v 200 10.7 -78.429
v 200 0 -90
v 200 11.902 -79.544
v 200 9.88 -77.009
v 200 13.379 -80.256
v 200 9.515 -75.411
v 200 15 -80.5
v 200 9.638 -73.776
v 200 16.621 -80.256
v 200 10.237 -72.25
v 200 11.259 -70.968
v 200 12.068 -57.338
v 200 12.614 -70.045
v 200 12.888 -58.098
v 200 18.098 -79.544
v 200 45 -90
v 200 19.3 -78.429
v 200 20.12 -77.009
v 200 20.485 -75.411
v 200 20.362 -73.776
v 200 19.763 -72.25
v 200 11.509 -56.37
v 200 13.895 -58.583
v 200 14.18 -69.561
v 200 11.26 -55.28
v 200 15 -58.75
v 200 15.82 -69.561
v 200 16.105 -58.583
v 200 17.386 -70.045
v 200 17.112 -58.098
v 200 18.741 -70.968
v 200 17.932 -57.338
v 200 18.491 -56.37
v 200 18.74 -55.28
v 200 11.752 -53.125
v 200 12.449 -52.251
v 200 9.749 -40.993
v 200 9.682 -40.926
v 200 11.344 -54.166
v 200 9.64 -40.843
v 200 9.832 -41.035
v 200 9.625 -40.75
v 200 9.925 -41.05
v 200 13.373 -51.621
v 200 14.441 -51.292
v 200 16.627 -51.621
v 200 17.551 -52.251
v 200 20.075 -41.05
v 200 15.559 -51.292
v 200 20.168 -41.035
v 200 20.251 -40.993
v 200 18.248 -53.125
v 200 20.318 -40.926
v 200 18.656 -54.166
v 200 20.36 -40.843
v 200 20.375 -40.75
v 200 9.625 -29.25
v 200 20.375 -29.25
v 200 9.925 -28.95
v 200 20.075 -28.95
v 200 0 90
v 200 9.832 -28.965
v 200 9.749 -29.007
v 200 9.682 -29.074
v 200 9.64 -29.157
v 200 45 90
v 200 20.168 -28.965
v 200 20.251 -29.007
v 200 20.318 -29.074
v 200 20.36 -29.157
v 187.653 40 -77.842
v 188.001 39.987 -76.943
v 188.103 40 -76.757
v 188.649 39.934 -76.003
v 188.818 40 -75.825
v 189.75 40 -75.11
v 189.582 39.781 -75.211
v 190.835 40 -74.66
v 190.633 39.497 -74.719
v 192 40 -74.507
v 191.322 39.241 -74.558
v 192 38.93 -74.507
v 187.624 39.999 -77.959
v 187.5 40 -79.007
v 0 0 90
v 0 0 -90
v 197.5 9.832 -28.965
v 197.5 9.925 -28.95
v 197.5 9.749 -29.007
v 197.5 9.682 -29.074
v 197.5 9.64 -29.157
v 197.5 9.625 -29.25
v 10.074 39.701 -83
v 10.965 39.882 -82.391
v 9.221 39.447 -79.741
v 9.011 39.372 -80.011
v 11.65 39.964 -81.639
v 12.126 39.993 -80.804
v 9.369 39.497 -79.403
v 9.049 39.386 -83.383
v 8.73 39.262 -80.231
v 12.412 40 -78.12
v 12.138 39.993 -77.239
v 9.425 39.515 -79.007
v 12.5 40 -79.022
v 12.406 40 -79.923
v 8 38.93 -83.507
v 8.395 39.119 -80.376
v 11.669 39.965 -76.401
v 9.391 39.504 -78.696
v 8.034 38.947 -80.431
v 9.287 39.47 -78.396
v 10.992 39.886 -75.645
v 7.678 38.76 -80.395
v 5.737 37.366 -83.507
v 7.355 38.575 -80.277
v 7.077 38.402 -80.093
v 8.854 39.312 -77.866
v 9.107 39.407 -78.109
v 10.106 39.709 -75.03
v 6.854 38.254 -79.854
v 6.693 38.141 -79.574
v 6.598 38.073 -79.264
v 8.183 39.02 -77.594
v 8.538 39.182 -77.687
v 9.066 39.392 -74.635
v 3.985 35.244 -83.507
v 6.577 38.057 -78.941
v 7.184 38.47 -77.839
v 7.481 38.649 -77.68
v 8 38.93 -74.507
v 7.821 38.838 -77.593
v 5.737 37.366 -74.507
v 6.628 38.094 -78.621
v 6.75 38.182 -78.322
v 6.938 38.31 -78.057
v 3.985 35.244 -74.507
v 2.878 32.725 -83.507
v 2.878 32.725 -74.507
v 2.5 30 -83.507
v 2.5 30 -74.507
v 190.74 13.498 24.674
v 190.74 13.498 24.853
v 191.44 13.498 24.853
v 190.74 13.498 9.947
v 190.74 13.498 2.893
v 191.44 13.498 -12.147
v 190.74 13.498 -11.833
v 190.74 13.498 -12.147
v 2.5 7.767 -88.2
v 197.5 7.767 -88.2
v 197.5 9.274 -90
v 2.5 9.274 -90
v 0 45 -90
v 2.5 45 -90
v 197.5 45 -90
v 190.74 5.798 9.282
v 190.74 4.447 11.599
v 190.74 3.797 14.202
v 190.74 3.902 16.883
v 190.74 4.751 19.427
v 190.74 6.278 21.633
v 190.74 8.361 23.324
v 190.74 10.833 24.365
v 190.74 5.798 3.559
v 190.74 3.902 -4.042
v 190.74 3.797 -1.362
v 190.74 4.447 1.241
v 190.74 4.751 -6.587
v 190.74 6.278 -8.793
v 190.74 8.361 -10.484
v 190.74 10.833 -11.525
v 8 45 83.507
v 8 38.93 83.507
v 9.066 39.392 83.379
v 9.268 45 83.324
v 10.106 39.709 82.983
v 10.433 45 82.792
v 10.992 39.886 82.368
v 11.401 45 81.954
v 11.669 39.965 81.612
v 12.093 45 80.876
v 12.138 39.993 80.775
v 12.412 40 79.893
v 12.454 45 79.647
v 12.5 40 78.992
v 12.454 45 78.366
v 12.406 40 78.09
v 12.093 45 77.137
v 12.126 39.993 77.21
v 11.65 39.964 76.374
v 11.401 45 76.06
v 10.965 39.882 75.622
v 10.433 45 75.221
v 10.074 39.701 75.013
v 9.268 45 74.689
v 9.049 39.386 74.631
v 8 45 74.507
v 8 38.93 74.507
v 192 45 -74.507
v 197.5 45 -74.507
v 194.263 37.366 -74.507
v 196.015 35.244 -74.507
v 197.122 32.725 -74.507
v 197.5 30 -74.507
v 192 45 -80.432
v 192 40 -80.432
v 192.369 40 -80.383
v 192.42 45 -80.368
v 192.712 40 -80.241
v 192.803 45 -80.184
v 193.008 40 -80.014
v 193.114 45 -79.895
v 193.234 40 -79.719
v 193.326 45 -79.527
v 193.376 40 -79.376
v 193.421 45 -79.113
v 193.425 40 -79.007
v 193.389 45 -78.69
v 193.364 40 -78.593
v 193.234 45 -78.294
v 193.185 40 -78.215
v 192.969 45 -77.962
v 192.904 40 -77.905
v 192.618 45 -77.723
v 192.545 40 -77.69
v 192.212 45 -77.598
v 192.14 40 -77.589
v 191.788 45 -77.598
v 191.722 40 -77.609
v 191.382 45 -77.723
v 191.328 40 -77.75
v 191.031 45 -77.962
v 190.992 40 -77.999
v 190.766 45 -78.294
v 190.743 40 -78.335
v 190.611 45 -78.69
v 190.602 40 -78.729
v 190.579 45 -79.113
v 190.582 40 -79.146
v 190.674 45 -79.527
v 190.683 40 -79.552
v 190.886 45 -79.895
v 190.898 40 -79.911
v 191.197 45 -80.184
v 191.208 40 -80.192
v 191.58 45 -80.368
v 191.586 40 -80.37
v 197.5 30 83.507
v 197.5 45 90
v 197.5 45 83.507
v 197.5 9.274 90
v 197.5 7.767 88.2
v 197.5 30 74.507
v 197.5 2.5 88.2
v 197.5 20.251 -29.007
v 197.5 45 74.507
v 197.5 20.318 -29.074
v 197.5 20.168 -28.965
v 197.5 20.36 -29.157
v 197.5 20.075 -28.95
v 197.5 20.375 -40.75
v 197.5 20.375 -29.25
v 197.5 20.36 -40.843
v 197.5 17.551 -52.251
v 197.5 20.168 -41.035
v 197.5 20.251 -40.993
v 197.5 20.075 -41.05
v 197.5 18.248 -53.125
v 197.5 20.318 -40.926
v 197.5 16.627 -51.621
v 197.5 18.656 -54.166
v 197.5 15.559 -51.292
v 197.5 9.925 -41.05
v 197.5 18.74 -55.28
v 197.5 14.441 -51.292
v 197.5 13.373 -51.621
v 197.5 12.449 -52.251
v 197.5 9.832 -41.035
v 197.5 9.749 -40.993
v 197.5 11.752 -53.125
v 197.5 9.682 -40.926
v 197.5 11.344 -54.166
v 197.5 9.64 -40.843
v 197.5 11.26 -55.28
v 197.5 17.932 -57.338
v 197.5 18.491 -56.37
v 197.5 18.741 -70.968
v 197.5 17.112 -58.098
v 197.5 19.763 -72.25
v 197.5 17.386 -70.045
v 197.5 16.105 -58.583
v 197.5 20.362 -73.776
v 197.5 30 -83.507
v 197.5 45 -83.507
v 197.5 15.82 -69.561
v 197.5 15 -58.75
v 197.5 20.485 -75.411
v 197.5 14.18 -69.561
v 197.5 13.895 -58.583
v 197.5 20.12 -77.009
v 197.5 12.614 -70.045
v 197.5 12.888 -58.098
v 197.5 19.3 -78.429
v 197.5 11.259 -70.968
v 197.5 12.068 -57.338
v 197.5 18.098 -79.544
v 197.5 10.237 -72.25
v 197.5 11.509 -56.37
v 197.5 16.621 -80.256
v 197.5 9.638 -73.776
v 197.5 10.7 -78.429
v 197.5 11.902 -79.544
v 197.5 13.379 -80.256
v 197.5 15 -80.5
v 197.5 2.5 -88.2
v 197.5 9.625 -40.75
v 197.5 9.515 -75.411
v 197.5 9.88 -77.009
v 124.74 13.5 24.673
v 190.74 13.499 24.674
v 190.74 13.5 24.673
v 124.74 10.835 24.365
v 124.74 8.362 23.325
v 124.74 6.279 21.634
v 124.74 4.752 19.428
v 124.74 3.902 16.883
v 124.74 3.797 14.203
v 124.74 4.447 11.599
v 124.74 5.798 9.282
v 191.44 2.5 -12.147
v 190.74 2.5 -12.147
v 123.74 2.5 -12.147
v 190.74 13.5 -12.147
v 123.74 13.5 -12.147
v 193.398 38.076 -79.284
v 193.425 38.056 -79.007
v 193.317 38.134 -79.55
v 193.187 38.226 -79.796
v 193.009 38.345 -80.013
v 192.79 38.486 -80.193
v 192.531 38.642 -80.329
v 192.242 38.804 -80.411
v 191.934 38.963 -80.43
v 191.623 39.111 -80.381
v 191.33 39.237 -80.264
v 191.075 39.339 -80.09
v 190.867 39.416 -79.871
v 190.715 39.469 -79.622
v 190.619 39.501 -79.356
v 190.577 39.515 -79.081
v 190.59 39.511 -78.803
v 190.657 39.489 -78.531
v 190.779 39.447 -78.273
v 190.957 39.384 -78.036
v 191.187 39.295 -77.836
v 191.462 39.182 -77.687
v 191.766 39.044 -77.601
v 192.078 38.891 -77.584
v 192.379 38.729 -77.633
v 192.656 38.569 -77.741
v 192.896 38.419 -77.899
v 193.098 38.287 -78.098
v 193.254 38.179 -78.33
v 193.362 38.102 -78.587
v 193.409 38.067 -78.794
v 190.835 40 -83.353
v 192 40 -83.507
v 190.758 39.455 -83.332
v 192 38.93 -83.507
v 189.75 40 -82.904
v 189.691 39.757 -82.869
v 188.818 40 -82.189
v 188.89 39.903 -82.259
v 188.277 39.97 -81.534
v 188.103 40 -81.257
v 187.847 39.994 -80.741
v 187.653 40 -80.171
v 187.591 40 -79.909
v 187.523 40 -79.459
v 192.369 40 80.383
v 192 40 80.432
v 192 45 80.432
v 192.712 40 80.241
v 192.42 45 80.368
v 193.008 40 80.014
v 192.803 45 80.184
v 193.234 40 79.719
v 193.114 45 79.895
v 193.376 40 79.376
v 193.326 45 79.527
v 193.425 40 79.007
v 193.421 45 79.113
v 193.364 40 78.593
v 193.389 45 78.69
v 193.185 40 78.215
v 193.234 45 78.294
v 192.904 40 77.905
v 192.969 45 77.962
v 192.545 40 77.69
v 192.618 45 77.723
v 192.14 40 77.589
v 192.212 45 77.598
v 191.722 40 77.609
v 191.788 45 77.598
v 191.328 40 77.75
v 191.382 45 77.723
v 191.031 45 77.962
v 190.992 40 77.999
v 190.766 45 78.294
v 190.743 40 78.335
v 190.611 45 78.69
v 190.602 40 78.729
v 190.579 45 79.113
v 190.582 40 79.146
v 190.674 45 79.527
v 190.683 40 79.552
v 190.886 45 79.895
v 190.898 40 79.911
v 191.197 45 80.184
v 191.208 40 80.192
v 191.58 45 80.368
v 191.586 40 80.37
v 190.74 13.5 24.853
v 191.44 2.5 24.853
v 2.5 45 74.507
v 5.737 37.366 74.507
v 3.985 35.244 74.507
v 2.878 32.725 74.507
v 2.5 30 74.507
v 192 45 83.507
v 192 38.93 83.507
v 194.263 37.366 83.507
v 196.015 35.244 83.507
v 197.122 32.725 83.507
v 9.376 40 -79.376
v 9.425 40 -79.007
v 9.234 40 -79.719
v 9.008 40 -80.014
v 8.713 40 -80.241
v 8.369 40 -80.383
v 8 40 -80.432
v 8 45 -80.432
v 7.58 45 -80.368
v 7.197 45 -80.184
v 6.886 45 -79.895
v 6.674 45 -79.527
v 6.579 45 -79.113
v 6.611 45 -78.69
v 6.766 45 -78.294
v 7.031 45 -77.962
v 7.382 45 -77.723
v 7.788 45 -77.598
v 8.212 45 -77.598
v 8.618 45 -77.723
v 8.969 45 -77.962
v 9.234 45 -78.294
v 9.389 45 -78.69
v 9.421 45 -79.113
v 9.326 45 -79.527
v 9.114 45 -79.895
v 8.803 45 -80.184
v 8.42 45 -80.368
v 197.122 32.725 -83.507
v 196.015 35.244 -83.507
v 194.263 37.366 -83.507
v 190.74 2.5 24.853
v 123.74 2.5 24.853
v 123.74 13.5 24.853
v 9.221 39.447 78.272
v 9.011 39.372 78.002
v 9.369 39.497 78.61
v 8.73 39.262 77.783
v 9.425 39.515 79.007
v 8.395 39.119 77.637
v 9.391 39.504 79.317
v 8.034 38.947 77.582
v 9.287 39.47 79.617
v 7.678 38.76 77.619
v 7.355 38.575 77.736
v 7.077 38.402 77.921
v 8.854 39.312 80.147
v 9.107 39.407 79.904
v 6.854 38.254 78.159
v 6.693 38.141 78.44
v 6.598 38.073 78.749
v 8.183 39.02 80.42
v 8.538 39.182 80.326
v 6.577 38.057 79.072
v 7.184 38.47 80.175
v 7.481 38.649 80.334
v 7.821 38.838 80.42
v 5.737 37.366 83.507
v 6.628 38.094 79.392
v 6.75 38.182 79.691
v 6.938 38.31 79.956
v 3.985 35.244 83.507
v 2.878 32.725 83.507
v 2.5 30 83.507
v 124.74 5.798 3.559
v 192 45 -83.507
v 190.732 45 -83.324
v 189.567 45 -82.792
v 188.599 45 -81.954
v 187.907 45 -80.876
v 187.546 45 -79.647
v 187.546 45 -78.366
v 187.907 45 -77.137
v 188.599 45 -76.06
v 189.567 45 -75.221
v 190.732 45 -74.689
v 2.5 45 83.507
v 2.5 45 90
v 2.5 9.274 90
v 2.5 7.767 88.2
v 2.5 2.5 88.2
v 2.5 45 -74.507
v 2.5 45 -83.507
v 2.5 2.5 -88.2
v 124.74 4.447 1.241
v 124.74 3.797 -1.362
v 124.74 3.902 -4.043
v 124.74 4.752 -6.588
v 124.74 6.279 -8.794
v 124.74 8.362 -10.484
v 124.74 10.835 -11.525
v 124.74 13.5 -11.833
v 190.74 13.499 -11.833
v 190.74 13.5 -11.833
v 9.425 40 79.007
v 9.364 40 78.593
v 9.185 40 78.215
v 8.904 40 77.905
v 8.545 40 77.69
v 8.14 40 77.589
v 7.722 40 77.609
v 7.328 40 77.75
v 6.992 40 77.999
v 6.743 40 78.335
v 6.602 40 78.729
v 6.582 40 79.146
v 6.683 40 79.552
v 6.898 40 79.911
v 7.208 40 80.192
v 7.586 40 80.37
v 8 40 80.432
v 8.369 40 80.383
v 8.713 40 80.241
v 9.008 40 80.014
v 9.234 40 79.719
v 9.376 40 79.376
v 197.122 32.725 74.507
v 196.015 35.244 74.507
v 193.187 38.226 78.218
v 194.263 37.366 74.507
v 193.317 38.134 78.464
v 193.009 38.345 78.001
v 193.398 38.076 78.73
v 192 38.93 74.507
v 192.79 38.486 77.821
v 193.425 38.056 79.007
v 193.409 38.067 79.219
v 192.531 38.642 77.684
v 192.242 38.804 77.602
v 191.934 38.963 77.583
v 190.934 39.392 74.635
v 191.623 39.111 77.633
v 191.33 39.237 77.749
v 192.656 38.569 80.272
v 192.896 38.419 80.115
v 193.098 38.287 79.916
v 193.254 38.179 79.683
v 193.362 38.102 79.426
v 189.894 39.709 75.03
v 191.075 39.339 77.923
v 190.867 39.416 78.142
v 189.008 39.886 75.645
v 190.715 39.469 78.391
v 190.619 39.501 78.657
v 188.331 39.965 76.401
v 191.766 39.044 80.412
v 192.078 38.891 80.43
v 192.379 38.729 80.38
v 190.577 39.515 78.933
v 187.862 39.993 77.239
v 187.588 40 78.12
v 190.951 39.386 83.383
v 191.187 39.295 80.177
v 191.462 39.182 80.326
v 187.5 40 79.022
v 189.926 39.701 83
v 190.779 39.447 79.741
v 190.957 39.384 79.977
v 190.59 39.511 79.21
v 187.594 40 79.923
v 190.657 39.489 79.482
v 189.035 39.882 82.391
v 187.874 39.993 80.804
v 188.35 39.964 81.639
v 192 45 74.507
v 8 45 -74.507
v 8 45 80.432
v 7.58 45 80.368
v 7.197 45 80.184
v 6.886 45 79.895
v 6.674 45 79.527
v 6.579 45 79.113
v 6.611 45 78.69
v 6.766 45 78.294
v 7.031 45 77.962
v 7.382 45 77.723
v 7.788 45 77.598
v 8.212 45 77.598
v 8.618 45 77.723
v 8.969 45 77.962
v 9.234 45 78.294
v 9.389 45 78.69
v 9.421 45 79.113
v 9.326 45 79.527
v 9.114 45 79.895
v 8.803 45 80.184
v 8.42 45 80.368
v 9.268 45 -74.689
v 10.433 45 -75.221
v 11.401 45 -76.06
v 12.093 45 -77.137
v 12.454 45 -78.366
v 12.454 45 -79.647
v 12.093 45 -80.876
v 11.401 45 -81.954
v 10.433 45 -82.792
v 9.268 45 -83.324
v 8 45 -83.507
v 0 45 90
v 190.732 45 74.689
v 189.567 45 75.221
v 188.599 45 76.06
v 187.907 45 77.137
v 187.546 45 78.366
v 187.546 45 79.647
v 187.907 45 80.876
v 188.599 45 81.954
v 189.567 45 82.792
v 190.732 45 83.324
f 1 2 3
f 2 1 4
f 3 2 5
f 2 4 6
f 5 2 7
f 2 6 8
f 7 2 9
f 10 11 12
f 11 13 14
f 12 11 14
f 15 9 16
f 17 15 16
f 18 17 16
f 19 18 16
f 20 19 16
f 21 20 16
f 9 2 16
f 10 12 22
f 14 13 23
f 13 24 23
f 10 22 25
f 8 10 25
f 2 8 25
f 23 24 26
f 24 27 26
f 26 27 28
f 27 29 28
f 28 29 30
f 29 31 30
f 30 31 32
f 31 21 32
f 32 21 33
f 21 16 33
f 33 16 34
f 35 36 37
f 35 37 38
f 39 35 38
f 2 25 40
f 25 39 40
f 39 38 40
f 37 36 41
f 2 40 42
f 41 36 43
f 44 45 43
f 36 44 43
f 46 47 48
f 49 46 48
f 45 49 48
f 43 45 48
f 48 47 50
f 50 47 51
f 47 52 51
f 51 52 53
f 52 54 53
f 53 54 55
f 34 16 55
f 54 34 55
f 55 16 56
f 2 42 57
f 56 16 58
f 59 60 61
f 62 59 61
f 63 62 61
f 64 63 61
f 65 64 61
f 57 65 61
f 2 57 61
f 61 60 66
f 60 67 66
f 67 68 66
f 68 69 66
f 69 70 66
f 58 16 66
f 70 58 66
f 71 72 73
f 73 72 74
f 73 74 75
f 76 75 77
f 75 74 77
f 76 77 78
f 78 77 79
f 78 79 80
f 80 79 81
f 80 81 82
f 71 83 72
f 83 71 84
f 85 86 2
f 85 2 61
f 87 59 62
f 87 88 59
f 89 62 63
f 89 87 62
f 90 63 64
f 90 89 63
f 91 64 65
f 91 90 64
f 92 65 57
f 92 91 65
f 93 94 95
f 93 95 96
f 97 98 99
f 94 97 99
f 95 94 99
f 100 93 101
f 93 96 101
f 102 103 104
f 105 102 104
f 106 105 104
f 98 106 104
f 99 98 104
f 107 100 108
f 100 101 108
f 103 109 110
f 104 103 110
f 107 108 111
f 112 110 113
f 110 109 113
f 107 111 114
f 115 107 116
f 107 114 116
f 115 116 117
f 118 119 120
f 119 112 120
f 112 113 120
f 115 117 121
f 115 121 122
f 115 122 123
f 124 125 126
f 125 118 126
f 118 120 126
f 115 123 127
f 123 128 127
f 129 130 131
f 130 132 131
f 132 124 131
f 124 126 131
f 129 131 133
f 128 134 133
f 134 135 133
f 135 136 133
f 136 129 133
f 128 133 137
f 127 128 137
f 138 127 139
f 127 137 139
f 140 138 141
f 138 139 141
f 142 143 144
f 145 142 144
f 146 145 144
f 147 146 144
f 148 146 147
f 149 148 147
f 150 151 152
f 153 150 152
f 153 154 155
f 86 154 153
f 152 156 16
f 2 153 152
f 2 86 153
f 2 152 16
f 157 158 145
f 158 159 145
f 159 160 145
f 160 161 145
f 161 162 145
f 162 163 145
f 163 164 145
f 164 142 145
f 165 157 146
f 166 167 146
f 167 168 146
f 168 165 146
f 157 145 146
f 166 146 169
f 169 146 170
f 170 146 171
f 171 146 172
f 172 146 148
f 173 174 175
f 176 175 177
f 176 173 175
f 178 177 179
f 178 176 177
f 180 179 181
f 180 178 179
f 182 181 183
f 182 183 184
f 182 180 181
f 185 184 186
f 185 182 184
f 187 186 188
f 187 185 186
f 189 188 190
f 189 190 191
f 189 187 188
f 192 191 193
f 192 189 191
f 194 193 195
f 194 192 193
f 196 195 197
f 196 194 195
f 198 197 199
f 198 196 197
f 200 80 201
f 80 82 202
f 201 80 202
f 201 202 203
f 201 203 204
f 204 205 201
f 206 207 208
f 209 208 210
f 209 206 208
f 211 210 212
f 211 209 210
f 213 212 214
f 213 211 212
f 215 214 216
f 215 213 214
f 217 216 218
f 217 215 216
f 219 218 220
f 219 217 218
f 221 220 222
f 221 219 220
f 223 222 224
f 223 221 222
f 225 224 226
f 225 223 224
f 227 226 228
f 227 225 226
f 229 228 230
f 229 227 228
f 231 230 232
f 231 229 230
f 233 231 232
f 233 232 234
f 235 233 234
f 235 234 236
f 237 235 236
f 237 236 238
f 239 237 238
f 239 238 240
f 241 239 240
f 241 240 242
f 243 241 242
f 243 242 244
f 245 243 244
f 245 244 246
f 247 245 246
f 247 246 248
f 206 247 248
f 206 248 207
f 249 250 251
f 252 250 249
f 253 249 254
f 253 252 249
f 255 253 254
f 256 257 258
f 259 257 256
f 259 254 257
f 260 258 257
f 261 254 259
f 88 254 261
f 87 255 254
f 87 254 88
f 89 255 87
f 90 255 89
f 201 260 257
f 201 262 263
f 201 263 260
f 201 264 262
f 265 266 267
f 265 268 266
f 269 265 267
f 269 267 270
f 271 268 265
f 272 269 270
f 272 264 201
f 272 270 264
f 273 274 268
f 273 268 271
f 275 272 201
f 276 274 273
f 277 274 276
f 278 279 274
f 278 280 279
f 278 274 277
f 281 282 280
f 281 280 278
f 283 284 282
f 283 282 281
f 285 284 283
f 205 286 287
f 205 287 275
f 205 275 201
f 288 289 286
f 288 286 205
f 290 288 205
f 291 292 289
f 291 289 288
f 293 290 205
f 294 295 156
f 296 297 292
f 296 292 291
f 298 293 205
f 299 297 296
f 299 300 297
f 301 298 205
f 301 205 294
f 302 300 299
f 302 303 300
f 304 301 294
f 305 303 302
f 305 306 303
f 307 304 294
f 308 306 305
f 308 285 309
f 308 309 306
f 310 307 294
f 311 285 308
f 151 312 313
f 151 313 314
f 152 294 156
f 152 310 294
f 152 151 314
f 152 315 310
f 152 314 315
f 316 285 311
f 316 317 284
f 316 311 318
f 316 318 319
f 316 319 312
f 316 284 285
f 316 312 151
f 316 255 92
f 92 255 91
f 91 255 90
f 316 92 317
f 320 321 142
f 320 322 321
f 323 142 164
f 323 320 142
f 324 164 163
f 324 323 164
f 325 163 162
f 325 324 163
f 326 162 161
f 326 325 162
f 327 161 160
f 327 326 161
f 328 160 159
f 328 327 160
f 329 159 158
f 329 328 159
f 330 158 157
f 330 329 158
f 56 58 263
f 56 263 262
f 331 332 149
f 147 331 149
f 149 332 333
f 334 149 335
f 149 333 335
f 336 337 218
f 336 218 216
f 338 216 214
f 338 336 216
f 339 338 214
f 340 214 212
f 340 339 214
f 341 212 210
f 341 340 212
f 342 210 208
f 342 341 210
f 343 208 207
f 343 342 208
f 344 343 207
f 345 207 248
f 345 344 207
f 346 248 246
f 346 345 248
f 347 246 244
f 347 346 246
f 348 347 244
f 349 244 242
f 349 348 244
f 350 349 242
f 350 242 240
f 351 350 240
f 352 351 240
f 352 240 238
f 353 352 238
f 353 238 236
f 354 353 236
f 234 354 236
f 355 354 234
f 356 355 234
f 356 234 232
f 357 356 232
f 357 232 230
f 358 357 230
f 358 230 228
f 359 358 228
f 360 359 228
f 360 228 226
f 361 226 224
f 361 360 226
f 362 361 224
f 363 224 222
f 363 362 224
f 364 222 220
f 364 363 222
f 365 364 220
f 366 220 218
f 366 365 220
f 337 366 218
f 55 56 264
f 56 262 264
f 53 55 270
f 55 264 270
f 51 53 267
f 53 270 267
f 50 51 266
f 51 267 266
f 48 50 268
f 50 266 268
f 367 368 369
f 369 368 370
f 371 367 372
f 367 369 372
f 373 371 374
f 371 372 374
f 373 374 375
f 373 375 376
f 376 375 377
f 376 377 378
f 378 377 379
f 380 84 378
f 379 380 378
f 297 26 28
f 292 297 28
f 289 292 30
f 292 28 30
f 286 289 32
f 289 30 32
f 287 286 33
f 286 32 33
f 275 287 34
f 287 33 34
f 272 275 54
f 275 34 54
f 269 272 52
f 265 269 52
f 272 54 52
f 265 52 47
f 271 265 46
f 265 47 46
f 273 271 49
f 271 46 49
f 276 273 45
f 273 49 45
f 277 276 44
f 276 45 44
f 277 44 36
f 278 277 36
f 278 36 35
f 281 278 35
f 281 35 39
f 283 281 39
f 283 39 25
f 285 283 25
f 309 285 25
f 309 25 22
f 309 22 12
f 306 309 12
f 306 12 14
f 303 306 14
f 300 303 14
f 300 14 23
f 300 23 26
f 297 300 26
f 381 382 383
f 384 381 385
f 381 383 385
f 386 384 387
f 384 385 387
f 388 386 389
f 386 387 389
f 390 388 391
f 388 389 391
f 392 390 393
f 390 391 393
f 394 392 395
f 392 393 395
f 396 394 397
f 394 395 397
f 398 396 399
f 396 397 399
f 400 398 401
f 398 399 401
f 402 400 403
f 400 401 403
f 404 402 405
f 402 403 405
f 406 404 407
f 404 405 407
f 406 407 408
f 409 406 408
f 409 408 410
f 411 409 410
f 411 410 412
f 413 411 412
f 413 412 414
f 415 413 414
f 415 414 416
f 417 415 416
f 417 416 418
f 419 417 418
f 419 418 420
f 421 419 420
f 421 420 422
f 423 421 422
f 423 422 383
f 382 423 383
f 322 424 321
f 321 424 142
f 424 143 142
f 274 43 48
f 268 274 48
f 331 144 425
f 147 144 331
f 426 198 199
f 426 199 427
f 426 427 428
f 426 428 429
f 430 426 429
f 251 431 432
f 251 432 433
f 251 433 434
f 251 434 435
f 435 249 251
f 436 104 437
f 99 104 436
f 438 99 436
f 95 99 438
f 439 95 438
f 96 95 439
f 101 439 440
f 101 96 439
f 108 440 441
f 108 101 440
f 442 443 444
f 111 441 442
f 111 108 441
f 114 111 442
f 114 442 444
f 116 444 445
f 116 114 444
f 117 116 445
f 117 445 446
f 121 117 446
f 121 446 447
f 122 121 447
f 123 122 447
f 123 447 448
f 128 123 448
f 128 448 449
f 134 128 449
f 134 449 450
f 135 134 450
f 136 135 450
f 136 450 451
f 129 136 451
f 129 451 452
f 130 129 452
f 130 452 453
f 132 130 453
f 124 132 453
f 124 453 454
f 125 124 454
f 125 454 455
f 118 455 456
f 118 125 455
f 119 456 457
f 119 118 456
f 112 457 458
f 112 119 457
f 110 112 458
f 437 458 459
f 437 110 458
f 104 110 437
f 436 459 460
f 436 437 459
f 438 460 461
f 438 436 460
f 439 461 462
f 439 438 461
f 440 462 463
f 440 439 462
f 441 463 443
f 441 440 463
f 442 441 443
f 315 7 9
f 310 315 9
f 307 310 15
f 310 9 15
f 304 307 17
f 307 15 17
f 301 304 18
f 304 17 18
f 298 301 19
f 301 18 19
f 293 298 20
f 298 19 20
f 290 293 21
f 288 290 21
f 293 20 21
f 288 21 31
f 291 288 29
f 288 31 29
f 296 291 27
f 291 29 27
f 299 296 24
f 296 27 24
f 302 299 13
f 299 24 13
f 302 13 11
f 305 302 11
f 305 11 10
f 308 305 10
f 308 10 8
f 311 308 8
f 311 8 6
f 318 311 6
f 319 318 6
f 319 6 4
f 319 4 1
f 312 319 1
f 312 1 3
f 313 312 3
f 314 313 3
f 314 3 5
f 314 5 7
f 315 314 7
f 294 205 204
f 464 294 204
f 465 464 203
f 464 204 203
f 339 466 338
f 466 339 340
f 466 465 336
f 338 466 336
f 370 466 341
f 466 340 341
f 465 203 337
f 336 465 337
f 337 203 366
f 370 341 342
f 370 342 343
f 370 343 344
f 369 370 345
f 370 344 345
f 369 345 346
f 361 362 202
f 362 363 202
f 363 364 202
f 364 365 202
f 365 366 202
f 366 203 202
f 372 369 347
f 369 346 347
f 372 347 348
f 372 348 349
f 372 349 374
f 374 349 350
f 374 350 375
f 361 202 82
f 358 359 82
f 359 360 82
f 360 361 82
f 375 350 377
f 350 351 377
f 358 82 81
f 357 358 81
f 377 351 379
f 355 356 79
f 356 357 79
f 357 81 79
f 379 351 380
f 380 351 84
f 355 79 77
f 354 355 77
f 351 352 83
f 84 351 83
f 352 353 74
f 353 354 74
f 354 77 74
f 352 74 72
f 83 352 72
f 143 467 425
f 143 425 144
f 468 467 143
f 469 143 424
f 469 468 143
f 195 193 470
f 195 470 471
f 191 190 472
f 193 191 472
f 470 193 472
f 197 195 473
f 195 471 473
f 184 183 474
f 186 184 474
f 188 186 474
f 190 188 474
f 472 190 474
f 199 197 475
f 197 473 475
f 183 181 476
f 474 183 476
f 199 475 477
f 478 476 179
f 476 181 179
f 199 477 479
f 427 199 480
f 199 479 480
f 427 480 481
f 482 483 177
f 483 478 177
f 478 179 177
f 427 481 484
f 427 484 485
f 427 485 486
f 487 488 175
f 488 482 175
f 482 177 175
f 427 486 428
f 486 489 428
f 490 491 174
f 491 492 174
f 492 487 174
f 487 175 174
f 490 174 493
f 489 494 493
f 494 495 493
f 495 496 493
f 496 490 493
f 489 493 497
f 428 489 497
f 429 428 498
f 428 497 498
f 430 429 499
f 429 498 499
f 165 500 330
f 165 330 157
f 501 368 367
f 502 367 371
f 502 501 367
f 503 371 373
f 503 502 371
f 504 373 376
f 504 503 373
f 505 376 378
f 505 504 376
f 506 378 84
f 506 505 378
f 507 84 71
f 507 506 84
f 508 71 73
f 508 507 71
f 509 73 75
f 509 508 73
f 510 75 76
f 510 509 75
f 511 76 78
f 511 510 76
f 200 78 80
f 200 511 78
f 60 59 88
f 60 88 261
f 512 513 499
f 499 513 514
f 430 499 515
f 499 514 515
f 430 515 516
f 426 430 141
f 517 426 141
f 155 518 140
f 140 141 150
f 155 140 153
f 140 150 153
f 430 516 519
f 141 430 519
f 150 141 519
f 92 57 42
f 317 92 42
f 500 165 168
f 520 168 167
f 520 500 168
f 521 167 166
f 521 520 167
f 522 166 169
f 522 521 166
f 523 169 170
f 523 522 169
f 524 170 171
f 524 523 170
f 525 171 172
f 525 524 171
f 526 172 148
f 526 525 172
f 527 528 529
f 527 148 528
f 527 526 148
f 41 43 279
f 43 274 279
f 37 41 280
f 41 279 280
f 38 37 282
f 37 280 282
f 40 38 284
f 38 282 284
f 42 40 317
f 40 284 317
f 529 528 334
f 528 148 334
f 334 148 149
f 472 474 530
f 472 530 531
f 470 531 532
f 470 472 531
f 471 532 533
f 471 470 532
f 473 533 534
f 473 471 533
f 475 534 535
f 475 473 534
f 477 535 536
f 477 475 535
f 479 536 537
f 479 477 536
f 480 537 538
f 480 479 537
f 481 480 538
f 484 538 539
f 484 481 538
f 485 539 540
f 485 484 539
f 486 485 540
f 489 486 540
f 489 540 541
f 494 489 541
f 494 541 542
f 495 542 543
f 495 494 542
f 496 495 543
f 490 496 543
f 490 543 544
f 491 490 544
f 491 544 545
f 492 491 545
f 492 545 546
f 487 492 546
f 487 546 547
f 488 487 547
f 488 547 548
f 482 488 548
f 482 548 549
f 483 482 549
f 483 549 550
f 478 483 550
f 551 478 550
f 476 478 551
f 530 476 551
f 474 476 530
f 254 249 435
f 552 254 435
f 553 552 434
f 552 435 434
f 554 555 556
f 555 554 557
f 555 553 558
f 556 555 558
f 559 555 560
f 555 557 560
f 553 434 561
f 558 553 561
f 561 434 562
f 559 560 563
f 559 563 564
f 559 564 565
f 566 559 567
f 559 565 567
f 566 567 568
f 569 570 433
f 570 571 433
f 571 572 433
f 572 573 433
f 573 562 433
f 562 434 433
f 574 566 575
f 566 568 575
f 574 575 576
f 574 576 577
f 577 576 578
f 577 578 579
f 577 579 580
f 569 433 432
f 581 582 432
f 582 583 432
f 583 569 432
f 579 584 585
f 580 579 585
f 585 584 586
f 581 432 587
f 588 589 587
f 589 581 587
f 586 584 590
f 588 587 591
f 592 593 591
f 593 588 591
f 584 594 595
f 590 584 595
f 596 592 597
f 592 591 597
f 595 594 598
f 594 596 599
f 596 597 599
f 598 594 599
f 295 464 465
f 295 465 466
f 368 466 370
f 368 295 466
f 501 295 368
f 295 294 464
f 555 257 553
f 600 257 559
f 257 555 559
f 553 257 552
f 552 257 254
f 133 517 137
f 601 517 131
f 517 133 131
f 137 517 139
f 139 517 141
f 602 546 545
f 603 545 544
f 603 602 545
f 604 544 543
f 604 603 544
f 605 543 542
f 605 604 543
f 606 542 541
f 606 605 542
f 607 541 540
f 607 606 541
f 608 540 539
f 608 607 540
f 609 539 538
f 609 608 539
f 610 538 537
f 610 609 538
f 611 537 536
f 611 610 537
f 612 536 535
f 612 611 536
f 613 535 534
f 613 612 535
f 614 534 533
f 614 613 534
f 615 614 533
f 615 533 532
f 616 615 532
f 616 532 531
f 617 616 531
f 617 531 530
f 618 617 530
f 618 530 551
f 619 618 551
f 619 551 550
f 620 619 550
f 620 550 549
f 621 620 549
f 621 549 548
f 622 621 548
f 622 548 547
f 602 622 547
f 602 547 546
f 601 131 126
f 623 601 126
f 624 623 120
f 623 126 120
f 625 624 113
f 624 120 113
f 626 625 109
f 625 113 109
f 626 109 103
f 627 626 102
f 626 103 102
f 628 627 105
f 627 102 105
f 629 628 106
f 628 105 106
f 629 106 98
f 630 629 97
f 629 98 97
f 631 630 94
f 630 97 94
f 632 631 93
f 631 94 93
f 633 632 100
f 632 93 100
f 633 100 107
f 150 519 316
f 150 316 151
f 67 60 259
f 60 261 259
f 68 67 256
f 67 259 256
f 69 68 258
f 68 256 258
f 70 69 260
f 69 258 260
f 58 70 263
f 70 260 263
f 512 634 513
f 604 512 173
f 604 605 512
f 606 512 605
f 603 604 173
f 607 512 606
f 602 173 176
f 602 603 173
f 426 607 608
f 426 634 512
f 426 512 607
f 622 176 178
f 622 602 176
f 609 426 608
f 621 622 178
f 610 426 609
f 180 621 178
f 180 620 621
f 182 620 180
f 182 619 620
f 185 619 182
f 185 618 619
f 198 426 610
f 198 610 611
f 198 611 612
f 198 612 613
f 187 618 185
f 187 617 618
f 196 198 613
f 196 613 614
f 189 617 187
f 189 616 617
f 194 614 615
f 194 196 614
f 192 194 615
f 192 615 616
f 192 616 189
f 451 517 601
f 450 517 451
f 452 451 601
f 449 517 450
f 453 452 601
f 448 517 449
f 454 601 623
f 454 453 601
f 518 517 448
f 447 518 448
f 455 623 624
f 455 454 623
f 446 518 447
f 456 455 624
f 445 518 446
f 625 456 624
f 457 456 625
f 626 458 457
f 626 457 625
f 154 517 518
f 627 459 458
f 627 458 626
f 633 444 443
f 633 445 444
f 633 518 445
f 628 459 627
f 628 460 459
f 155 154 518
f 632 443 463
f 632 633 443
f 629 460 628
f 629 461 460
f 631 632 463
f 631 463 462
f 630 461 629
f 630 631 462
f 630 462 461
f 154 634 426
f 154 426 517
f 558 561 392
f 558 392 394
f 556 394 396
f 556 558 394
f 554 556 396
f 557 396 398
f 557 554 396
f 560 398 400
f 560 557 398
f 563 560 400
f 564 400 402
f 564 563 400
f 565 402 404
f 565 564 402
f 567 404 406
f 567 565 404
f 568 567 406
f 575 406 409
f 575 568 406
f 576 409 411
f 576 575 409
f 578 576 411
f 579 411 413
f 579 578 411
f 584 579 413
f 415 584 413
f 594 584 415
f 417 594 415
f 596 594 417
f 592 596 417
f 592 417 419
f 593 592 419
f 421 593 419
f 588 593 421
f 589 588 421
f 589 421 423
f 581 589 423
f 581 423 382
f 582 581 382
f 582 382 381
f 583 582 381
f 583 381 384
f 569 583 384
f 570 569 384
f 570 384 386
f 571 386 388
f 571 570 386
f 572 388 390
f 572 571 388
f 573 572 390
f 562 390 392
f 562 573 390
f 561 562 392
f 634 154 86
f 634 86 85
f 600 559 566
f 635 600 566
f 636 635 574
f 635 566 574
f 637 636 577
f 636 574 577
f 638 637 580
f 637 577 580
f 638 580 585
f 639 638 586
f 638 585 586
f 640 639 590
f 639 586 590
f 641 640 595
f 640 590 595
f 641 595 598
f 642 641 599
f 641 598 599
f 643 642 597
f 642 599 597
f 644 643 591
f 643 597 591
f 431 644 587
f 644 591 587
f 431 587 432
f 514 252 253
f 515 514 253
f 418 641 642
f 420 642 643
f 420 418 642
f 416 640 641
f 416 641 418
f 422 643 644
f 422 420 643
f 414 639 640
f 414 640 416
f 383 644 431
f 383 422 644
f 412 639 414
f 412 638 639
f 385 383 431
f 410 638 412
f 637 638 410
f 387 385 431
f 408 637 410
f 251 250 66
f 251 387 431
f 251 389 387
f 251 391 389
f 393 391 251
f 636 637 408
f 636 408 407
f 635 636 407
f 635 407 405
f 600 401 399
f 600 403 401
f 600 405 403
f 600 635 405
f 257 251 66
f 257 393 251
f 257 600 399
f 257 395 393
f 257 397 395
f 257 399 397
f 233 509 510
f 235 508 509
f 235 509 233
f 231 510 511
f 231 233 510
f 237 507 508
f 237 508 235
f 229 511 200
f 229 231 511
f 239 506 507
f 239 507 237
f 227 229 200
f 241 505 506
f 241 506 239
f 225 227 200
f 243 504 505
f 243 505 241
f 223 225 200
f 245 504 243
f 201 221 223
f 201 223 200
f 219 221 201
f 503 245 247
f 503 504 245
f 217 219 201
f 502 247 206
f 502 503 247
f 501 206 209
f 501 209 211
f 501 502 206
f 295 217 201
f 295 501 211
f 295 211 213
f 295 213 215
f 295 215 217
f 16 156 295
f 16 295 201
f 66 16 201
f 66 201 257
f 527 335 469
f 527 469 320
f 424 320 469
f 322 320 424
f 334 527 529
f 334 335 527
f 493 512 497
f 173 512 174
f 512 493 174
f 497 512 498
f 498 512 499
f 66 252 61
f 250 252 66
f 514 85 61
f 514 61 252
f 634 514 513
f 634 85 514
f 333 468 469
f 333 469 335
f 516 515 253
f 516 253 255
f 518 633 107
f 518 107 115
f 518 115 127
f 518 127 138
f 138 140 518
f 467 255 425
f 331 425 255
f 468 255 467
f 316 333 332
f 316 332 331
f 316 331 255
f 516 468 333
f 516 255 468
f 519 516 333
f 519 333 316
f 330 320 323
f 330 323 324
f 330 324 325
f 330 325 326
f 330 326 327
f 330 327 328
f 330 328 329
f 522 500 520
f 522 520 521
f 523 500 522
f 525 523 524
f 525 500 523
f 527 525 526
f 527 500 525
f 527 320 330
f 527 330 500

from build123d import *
from build123d.topology import SkipClean

# Parameters (mm, degrees)
SALIENTE_EXTRUIR1_DEPTH    = 200
CROQUIS2_W                 = 2.5
CROQUIS2_H                 = 180
SALIENTE_EXTRUIR2_DEPTH    = 42.5
CROQUIS3_R                 = 5.5
CORTAR_EXTRUIR1_DEPTH      = 4
CROQUIS4_R                 = 3.75
CORTAR_EXTRUIR2_DEPTH      = 4
CROQUIS7_W                 = 12.1
CROQUIS7_H                 = 10.75
CORTAR_EXTRUIR3_DEPTH      = 4
REDONDEO1_R                = 0.3
CROQUIS8_R                 = 1.425
SALIENTE_EXTRUIR3_DEPTH    = 5
SIMETR_A2_COPY_1_SKETCH_R  = 1.425
SIMETR_A2_COPY_1_DEPTH     = 5
REDONDEO4_START            = 29.9999999
REDONDEO4_OUTLINE_R        = 1.425
REDONDEO4_DEPTH            = 10.0000001
REDONDEO4_2_OUTLINE_W      = 10
REDONDEO4_2_OUTLINE_H      = 9.000004552
REDONDEO4_2_OUTLINE_H_2    = 9.000004551
REDONDEO5_START            = 29.9999999
REDONDEO5_OUTLINE_R        = 1.425
REDONDEO5_DEPTH            = 10.0000001
REDONDEO5_2_OUTLINE_W      = 10
REDONDEO5_2_OUTLINE_H      = 9.000004551
REDONDEO5_2_OUTLINE_H_2    = 9.000004552
CROQUIS9_W                 = 67
CROQUIS9_H                 = 37
SALIENTE_EXTRUIR4_DEPTH    = 20
CORTAR_EXTRUIR5_DEPTH      = 1
CORTAR_EXTRUIR5_DEPTH_BACK = 66
CROQUIS11_W                = 69.586098965
CROQUIS11_H                = 38.970086607
CORTAR_EXTRUIR6_DEPTH      = 9
CROQUIS12_W                = 37
CROQUIS12_H                = 10.997736301
SALIENTE_EXTRUIR5_DEPTH    = 0.7
CROQUIS14_W                = 66
CROQUIS14_H                = 7.054690465
CORTAR_EXTRUIR7_DEPTH      = 7.7


with BuildPart() as part:
    # Croquis1 → Saliente-Extruir1 (new body)
    with BuildSketch(Plane(origin=(0, 0, 0), x_dir=(0, 0, -1), z_dir=(1, 0, 0))):
        Polygon((90, 9.273962115), (90, 0), (-90, 0), (-90, 9.273962115), (-88.2, 7.766551311), (-88.2, 2.5), (88.2, 2.5), (88.2, 7.766551311), align=None)
    extrude(amount=SALIENTE_EXTRUIR1_DEPTH)

    # Croquis2 → Saliente-Extruir2 (add)
    with BuildSketch(Plane(origin=(0, 2.5, 0), x_dir=(1, 0, 0), z_dir=(0, 1, 0))):
        with Locations((198.75, 0)):
            Rectangle(CROQUIS2_W, CROQUIS2_H)
        with Locations((1.25, 0)):
            Rectangle(CROQUIS2_W, CROQUIS2_H)
    extrude(amount=SALIENTE_EXTRUIR2_DEPTH)

    # Croquis3 → Cortar-Extruir1 (cut)
    with BuildSketch(Plane(origin=(200, 0, 0), x_dir=(0, 0, -1), z_dir=(1, 0, 0))):
        with Locations((75, 15)):
            Circle(CROQUIS3_R)
    extrude(amount=-CORTAR_EXTRUIR1_DEPTH, mode=Mode.SUBTRACT)

    # Croquis4 → Cortar-Extruir2 (cut)
    with BuildSketch(Plane(origin=(200, 0, 0), x_dir=(0, 0, -1), z_dir=(1, 0, 0))):
        with Locations((55, 15)):
            Circle(CROQUIS4_R)
    extrude(amount=-CORTAR_EXTRUIR2_DEPTH, mode=Mode.SUBTRACT)

    # Croquis7 → Cortar-Extruir3 (cut)
    with BuildSketch(Plane(origin=(200, 0, 0), x_dir=(0, 0, -1), z_dir=(1, 0, 0))):
        with Locations((35, 15)):
            Rectangle(CROQUIS7_W, CROQUIS7_H)
    extrude(amount=-CORTAR_EXTRUIR3_DEPTH, mode=Mode.SUBTRACT)

    # Redondeo1
    redondeo1_edges = [part.edges().sort_by_distance(p)[0] for p in [
        (198.75, 20.375, -41.05),
        (198.75, 9.625, -41.05),
        (198.75, 9.625, -28.95),
        (198.75, 20.375, -28.95),
    ]]
    fillet(redondeo1_edges, radius=REDONDEO1_R)

    # Croquis8 → Saliente-Extruir3 (add)
    with BuildSketch(Plane(origin=(0, 45, 0), x_dir=(1, 0, 0), z_dir=(0, 1, 0))):
        with BuildLine():
            Line((192, -74.506703602), (197.5, -74.506703602))
            Line((197.5, -74.506703602), (197.5, -83.506703602))
            Line((197.5, -83.506703602), (192, -83.506703602))
            ThreePointArc((192, -83.506703602), (187.5, -79.006703602), (192, -74.506703602))
        make_face()
        with Locations(Location((192, -79.006703602, 0), (0, 0, 270))):
            Circle(CROQUIS8_R, mode=Mode.SUBTRACT)
    saliente_extruir3 = extrude(amount=-SALIENTE_EXTRUIR3_DEPTH)

    # Simetría1: Saliente-Extruir3 across plane
    add(saliente_extruir3.mirror(Plane.XY))

    # Simetría2: Saliente-Extruir3 across plane
    add(saliente_extruir3.mirror(Plane(origin=(100, 0, 0), x_dir=(0, 0, 1), z_dir=(1, 0, 0))))

    # Simetría2 copy 1 sketch → Simetría2 copy 1 (add)
    with BuildSketch(Plane(origin=(200, 45, 0), x_dir=(-1, 0, 0), z_dir=(0, 1, 0))):
        with BuildLine():
            Line((192, -74.506703602), (197.5, -74.506703602))
            Line((197.5, -74.506703602), (197.5, -83.506703602))
            Line((197.5, -83.506703602), (192, -83.506703602))
            ThreePointArc((192, -83.506703602), (187.5, -79.006703602), (192, -74.506703602))
        make_face()
        with Locations(Location((192, -79.006703602, 0), (0, 0, 270))):
            Circle(SIMETR_A2_COPY_1_SKETCH_R, mode=Mode.SUBTRACT)
    extrude(amount=-SIMETR_A2_COPY_1_DEPTH)

    # Redondeo4: read off the stored shape, not the designer's step
    # Redondeo4 outline → Redondeo4 (add)
    # profile 1 of 2: a face of its own
    with SkipClean():  # the faces are left unmerged after this step: merging them gives an invalid solid
        with BuildSketch(Plane(origin=(0, 0, 0), x_dir=(1, 0, 0), z_dir=(0, 1, 0)).offset(REDONDEO4_START)):
            with BuildLine():
                Line((197.5, -74.506703602), (192, -74.506703602))
                ThreePointArc((192, -74.506703602), (187.5, -79.006703602), (192, -83.506703602))
                Line((192, -83.506703602), (197.5, -83.506703602))
                Line((197.5, -83.506703602), (197.5, -74.506703602))
            make_face()
            with Locations((192, -79.006703602)):
                Circle(REDONDEO4_OUTLINE_R, mode=Mode.SUBTRACT)
        # profile 2 of 2: a face of its own
        with BuildSketch(Plane(origin=(0, 0, 0), x_dir=(1, 0, 0), z_dir=(0, 1, 0)).offset(REDONDEO4_START)):
            with BuildLine():
                Line((192, 74.506703602), (197.5, 74.506703602))
                Line((197.5, 74.506703602), (197.5, 83.506703602))
                Line((197.5, 83.506703602), (192, 83.506703602))
                ThreePointArc((192, 83.506703602), (187.5, 79.006703602), (192, 74.506703602))
            make_face()
            with Locations((192, 79.006703602)):
                Circle(REDONDEO4_OUTLINE_R, mode=Mode.SUBTRACT)
        extrude(amount=REDONDEO4_DEPTH)
    add(part.part.scale(1), mode=Mode.REPLACE)  # the faces are merged on a copy

    # Redondeo4 2 outline → Redondeo4 2 (revolve, cut)
    with BuildSketch(Plane(origin=(187.5, 30, 0), x_dir=(1, 0, 0), z_dir=(0, -1, 0))):
        with Locations((5, -79.006704338)):
            Rectangle(REDONDEO4_2_OUTLINE_W, REDONDEO4_2_OUTLINE_H)
        with Locations((5, 79.006702866)):
            Rectangle(REDONDEO4_2_OUTLINE_W, REDONDEO4_2_OUTLINE_H_2)
    revolve(axis=Axis((187.5, 30, 0), (0, 0, 1)), mode=Mode.SUBTRACT)

    # Redondeo5: read off the stored shape, not the designer's step
    # Redondeo5 outline → Redondeo5 (add)
    # profile 1 of 2: a face of its own
    with BuildSketch(Plane(origin=(0, 0, 0), x_dir=(1, 0, 0), z_dir=(0, 1, 0)).offset(REDONDEO5_START)):
        with BuildLine():
            Line((2.5, 83.506703602), (2.5, 74.506703602))
            Line((2.5, 74.506703602), (8, 74.506703602))
            ThreePointArc((8, 74.506703602), (12.5, 79.006703602), (8, 83.506703602))
            Line((8, 83.506703602), (2.5, 83.506703602))
        make_face()
        with Locations((8, 79.006703602)):
            Circle(REDONDEO5_OUTLINE_R, mode=Mode.SUBTRACT)
    # profile 2 of 2: a face of its own
    with BuildSketch(Plane(origin=(0, 0, 0), x_dir=(1, 0, 0), z_dir=(0, 1, 0)).offset(REDONDEO5_START)):
        with BuildLine():
            Line((8, -74.506703602), (2.5, -74.506703602))
            Line((2.5, -74.506703602), (2.5, -83.506703602))
            Line((2.5, -83.506703602), (8, -83.506703602))
            ThreePointArc((8, -83.506703602), (12.5, -79.006703602), (8, -74.506703602))
        make_face()
        with Locations((8, -79.006703602)):
            Circle(REDONDEO5_OUTLINE_R, mode=Mode.SUBTRACT)
    extrude(amount=REDONDEO5_DEPTH)

    # Redondeo5 2 outline → Redondeo5 2 (revolve, cut)
    with BuildSketch(Plane(origin=(12.5, 30, 0), x_dir=(1, 0, 0), z_dir=(0, -1, 0))):
        with Locations((5, -79.006702866)):
            Rectangle(REDONDEO5_2_OUTLINE_W, REDONDEO5_2_OUTLINE_H)
        with Locations((5, 79.006704338)):
            Rectangle(REDONDEO5_2_OUTLINE_W, REDONDEO5_2_OUTLINE_H_2)
    revolve(axis=Axis((12.5, 30, 0), (0, 0, 1)), mode=Mode.SUBTRACT)

    # Croquis9 → Saliente-Extruir4 (add)
    with BuildSketch(Plane(origin=(0, 2.5, 0), x_dir=(1, 0, 0), z_dir=(0, 1, 0))):
        with Locations((157.239750521, -6.353396278)):
            Rectangle(CROQUIS9_W, CROQUIS9_H)
    extrude(amount=SALIENTE_EXTRUIR4_DEPTH)

    # Croquis10 → Cortar-Extruir5 (cut, two sides: drawn at the far end of the back side and taken through both)
    with BuildSketch(Plane(origin=(190.739750521, 0, 0), x_dir=(0, 0, -1), z_dir=(1, 0, 0)).offset(-CORTAR_EXTRUIR5_DEPTH_BACK)):
        with BuildLine():
            ThreePointArc((-6.420068532, 16.930863921), (-24.676853259, 13.247289401), (-6.420068532, 9.563714882))
            ThreePointArc((-6.420068532, 9.563714882), (11.836716195, 13.247289401), (-6.420068532, 16.930863921))
        make_face()
    extrude(amount=CORTAR_EXTRUIR5_DEPTH + CORTAR_EXTRUIR5_DEPTH_BACK, mode=Mode.SUBTRACT)

    # Croquis11 → Cortar-Extruir6 (cut)
    with BuildSketch(Plane(origin=(0, 22.5, 0), x_dir=(1, 0, 0), z_dir=(0, 1, 0))):
        with Locations((157.239750521, -6.353396279)):
            Rectangle(CROQUIS11_W, CROQUIS11_H)
    extrude(amount=-CORTAR_EXTRUIR6_DEPTH, mode=Mode.SUBTRACT)

    # Croquis12 → Saliente-Extruir5 (add)
    with BuildSketch(Plane(origin=(190.739750521, 0, 0), x_dir=(0, 0, -1), z_dir=(1, 0, 0))):
        with Locations((-6.353396278, 7.998868151)):
            Rectangle(CROQUIS12_W, CROQUIS12_H)
    extrude(amount=SALIENTE_EXTRUIR5_DEPTH)

    # Croquis14 → Cortar-Extruir7 (cut)
    with BuildSketch(Plane(origin=(0, 13.497736301, 0), x_dir=(1, 0, 0), z_dir=(0, 1, 0))):
        with Locations((157.739750521, -6.420068533)):
            Rectangle(CROQUIS14_W, CROQUIS14_H)
    extrude(amount=-CORTAR_EXTRUIR7_DEPTH, mode=Mode.SUBTRACT)


solid = part.part
